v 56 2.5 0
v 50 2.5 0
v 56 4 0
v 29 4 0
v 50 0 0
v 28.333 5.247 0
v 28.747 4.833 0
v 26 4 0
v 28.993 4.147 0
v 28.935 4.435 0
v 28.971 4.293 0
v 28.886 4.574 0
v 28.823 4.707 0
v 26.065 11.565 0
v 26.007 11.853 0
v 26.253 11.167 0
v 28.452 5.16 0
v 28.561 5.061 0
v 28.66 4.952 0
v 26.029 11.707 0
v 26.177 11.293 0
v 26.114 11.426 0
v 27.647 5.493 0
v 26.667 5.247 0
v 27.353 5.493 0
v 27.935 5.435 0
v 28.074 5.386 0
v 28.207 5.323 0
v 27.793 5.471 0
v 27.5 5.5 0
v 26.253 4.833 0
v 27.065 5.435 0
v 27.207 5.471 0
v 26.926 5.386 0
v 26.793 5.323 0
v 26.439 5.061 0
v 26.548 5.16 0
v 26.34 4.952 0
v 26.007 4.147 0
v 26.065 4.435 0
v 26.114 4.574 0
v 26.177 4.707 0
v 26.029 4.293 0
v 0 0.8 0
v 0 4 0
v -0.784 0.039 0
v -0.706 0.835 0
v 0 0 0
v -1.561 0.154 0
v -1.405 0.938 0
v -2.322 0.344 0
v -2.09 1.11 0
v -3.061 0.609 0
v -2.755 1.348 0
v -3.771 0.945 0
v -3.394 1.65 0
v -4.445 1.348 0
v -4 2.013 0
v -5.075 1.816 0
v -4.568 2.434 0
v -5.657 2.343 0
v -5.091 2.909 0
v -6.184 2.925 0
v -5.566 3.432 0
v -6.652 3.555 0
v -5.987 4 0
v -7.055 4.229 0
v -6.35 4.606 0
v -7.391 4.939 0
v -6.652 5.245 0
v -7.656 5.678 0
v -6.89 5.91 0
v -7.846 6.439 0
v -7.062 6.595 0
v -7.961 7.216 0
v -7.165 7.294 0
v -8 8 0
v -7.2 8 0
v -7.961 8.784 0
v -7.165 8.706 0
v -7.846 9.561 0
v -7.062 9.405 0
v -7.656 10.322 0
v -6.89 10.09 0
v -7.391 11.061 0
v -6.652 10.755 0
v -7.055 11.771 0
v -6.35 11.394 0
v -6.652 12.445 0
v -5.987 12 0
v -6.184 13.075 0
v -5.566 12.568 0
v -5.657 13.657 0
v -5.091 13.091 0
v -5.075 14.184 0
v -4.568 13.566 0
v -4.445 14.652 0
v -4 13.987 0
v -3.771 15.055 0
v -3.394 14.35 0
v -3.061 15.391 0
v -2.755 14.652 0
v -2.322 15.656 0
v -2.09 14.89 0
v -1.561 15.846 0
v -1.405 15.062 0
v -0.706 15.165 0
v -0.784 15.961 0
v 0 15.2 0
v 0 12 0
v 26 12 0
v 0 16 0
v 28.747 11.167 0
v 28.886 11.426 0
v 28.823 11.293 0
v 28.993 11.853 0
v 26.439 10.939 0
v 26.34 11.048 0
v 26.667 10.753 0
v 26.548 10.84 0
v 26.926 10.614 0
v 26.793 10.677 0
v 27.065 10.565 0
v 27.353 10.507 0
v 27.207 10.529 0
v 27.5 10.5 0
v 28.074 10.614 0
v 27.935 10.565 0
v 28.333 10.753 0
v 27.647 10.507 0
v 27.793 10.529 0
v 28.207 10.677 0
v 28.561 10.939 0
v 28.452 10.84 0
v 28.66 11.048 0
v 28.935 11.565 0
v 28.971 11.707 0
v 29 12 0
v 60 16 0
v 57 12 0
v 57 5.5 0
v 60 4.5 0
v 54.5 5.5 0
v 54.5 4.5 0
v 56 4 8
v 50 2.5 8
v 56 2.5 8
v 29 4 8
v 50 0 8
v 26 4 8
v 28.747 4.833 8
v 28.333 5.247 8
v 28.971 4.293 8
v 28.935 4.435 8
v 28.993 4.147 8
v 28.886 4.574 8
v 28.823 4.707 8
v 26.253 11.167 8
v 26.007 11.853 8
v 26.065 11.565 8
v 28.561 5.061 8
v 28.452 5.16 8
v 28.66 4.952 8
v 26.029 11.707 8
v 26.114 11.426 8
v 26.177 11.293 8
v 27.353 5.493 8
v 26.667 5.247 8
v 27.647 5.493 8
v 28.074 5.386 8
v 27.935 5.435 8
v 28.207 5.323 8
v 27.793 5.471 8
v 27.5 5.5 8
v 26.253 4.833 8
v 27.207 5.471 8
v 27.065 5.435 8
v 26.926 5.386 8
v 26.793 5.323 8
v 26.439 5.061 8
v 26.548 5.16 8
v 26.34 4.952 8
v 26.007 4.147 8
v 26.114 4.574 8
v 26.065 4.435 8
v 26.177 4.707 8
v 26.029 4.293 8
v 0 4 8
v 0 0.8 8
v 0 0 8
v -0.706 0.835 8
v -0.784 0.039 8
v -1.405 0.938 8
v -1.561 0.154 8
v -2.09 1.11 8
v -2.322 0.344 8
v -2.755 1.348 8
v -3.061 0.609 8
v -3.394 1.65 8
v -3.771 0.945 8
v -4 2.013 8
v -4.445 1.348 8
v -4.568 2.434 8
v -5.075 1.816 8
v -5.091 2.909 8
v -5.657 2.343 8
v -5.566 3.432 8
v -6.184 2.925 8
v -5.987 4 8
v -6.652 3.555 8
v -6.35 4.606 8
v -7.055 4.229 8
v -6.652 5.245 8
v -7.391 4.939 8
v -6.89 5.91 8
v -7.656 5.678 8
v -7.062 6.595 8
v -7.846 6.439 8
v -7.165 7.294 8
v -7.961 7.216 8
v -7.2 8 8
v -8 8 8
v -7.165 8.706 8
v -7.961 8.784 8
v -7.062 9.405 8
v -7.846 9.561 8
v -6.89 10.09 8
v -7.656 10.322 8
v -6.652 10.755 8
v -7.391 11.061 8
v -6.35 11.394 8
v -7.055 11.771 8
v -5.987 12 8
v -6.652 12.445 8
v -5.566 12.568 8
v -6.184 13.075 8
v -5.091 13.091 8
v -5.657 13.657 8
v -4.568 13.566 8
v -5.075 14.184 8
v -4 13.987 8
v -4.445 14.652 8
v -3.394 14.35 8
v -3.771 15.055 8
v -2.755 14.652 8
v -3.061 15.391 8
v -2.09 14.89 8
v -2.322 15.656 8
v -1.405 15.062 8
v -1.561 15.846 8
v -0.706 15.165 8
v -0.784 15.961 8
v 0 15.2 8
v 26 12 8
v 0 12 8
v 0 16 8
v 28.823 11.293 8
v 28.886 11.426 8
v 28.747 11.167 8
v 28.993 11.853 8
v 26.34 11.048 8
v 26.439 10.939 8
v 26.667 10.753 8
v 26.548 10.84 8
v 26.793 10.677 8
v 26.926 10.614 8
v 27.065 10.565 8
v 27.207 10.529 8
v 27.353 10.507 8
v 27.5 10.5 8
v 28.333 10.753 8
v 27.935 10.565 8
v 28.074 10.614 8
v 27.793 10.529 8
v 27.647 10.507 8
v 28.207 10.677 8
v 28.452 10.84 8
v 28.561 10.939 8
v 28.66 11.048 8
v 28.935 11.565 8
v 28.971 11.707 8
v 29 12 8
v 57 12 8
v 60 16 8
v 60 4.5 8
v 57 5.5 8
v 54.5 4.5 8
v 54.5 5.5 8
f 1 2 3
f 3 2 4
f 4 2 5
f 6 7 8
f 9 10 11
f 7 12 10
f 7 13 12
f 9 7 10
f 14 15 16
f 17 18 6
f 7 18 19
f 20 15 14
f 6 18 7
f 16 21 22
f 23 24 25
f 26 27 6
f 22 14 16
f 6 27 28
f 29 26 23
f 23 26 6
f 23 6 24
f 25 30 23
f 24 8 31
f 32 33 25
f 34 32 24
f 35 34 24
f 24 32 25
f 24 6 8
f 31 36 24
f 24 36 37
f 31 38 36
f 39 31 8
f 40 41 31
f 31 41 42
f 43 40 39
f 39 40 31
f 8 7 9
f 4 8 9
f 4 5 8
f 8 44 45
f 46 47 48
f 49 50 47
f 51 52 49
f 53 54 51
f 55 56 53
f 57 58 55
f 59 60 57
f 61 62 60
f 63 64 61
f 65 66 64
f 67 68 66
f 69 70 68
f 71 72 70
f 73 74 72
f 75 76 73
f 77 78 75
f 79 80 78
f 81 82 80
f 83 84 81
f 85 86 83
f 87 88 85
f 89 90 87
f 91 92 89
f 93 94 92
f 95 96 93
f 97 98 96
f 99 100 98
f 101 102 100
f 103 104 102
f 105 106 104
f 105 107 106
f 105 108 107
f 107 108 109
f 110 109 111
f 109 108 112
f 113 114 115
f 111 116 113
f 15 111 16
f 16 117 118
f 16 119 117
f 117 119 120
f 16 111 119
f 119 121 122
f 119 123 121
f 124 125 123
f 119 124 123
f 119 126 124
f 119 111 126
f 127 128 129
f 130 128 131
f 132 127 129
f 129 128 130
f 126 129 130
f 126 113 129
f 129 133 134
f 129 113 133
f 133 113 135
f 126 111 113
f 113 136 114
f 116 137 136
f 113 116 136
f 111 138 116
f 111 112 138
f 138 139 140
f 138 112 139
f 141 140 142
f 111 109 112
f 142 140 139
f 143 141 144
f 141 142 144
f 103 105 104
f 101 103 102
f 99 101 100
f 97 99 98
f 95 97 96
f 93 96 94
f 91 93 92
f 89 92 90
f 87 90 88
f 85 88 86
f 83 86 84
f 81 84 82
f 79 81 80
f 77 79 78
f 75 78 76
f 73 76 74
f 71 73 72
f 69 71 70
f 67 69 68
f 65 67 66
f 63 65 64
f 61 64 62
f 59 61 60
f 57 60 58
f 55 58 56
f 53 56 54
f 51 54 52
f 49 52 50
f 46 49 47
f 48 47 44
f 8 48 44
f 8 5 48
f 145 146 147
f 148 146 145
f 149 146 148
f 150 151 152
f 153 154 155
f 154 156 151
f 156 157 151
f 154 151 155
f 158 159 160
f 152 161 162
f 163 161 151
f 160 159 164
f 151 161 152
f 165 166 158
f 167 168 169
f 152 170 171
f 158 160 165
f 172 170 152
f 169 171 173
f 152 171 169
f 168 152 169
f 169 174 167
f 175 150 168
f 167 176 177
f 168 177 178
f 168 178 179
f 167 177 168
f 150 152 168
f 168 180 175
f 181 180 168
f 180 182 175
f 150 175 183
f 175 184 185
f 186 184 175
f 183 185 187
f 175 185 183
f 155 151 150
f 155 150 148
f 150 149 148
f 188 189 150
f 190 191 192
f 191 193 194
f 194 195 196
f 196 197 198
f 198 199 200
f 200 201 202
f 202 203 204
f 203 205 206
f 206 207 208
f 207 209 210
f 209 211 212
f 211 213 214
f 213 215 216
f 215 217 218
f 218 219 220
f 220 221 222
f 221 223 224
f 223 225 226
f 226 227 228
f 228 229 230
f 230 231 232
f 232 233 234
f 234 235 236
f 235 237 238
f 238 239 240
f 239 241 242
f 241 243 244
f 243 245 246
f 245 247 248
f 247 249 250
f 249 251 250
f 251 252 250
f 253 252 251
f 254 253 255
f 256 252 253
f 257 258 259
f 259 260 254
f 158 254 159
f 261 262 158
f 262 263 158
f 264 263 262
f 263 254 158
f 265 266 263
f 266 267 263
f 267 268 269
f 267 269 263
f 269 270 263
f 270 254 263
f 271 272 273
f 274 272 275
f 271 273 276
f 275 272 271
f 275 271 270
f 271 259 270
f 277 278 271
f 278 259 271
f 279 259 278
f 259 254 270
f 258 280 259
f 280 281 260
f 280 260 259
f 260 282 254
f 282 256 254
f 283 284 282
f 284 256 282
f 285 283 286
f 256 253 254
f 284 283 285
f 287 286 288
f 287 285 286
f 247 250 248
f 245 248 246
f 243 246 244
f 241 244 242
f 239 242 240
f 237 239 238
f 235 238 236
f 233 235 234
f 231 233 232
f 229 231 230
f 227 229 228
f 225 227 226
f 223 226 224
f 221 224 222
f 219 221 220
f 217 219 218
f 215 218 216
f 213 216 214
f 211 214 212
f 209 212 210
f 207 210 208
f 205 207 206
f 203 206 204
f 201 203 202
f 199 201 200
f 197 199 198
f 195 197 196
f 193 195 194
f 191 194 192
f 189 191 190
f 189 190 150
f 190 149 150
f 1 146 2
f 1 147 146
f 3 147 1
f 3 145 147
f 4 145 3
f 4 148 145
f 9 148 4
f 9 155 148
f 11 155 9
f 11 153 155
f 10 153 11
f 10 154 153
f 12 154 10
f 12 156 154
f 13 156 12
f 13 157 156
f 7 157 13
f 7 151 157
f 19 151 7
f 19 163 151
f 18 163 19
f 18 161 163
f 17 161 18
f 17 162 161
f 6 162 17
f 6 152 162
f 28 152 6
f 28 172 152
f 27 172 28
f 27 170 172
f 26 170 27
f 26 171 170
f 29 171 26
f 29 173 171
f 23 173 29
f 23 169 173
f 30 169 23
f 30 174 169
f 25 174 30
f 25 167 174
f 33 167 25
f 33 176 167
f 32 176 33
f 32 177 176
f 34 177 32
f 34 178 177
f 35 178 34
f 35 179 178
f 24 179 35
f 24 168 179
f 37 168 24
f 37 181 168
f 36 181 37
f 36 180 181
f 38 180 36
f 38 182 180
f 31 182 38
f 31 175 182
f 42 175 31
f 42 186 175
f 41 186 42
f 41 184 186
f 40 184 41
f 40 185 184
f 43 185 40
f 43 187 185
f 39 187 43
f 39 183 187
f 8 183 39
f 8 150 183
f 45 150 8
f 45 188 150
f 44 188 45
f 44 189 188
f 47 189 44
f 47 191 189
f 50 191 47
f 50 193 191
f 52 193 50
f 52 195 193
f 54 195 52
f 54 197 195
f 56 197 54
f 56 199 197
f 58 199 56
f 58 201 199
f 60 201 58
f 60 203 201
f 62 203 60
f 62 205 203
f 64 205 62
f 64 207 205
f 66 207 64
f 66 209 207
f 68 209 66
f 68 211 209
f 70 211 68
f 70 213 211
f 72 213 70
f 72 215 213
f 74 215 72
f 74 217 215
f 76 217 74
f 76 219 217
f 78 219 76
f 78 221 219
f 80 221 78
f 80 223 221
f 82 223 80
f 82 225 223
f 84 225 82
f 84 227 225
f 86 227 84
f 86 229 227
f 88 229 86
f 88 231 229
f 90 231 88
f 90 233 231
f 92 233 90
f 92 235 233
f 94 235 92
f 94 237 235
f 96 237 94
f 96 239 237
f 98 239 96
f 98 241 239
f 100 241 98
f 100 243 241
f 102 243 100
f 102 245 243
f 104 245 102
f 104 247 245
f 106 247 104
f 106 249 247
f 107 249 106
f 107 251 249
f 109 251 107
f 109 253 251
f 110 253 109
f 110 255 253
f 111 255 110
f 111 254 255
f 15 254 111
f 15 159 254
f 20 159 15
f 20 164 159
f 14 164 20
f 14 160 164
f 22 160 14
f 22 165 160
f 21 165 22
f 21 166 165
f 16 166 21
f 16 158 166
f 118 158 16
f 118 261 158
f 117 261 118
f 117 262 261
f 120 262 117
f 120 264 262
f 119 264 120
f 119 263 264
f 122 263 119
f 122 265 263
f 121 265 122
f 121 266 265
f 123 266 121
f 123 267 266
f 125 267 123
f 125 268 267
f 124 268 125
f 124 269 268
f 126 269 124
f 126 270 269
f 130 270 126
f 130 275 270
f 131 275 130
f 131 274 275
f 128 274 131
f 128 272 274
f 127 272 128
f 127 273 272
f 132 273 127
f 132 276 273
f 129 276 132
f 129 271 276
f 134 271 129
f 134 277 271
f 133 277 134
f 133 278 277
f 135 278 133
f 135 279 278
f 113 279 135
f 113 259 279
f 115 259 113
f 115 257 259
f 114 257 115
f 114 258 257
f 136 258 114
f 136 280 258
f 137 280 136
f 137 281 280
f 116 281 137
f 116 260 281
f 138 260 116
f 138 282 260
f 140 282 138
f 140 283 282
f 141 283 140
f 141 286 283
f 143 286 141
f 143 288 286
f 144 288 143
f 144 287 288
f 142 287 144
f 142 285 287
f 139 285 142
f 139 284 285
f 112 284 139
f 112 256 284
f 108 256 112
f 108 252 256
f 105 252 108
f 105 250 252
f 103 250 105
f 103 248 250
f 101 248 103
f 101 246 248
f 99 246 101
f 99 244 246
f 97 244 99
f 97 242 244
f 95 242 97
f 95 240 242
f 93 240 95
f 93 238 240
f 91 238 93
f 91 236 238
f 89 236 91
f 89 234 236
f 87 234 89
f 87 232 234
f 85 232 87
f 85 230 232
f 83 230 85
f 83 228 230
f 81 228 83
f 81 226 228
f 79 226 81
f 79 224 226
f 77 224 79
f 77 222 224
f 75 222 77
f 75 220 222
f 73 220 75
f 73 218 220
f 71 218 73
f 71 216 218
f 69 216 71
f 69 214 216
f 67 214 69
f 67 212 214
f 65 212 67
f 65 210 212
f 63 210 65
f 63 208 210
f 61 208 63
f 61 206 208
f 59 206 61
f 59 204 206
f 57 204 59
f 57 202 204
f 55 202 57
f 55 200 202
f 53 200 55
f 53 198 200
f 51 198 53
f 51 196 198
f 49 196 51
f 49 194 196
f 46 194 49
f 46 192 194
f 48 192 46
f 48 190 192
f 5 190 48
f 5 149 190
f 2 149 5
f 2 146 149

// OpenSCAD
// Pinch Clamp for Silicone Tubing (up to 6.4 mm)
// Designed for FDM printing, flat orientation (extruded along Z)

// Global settings
$fn = 64; // High resolution for smooth curves
extrusion_height = 8; // Thickness of the clamp along Z

// Lower Jaw Dimensions
lower_jaw_x_start = 0;
lower_jaw_x_end = 50;
lower_jaw_y_start = 0;
lower_jaw_y_end = 4;

// Lower Jaw Tongue Dimensions
tongue_x_start = 50;
tongue_x_end = 56;
tongue_y_start = 2.5;
tongue_y_end = 4;

// Upper Jaw Dimensions
upper_jaw_x_start = 0;
upper_jaw_x_end = 60;
upper_jaw_y_start = 12;
upper_jaw_y_end = 16;

// Hinge Dimensions
hinge_center_x = 0;
hinge_center_y = 8;
hinge_inner_radius = 7.2;
hinge_outer_radius = 8;
hinge_thickness = hinge_outer_radius - hinge_inner_radius; // 0.8 mm

// Pinch Ridge Dimensions
ridge_radius = 1.5;
ridge_x_pos = 27.5;
lower_ridge_center_y = 4;
upper_ridge_center_y = 12;

// Latch Dimensions
latch_leg_x_start = 57;
latch_leg_x_end = 60;
latch_leg_y_start = 4.5;
latch_leg_y_end = 12;

latch_nose_x_start = 54.5;
latch_nose_x_end = 57;
latch_nose_y_start = 4.5;
latch_nose_y_end = 5.5;

// Extrude the profile along Z
linear_extrude(height = extrusion_height, convexity = 10) {
    // Lower Jaw
    translate([lower_jaw_x_start, lower_jaw_y_start])
        square([lower_jaw_x_end - lower_jaw_x_start, lower_jaw_y_end - lower_jaw_y_start]);

    // Lower Jaw Tongue
    translate([tongue_x_start, tongue_y_start])
        square([tongue_x_end - tongue_x_start, tongue_y_end - tongue_y_start]);

    // Upper Jaw
    translate([upper_jaw_x_start, upper_jaw_y_start])
        square([upper_jaw_x_end - upper_jaw_x_start, upper_jaw_y_end - upper_jaw_y_start]);

    // Hinge (Half-ring on x < 0 side)
    // We create a full annulus and then intersect with x < 0 half-plane
    intersection() {
        // The annulus
        difference() {
            translate([hinge_center_x, hinge_center_y])
                circle(r = hinge_outer_radius);
            translate([hinge_center_x, hinge_center_y])
                circle(r = hinge_inner_radius);
        }
        // Large square covering x < 0
        translate([-100, -100])
            square([100, 200]); // Covers x from -100 to 0, y from -100 to 100
    }

    // Pinch Ridges
    // Lower ridge: centered at (ridge_x_pos, lower_ridge_center_y)
    translate([ridge_x_pos, lower_ridge_center_y])
        circle(r = ridge_radius);

    // Upper ridge: centered at (ridge_x_pos, upper_ridge_center_y)
    translate([ridge_x_pos, upper_ridge_center_y])
        circle(r = ridge_radius);

    // Latch Leg
    translate([latch_leg_x_start, latch_leg_y_start])
        square([latch_leg_x_end - latch_leg_x_start, latch_leg_y_end - latch_leg_y_start]);

    // Latch Nose
    translate([latch_nose_x_start, latch_nose_y_start])
        square([latch_nose_x_end - latch_nose_x_start, latch_nose_y_end - latch_nose_y_start]);
}
